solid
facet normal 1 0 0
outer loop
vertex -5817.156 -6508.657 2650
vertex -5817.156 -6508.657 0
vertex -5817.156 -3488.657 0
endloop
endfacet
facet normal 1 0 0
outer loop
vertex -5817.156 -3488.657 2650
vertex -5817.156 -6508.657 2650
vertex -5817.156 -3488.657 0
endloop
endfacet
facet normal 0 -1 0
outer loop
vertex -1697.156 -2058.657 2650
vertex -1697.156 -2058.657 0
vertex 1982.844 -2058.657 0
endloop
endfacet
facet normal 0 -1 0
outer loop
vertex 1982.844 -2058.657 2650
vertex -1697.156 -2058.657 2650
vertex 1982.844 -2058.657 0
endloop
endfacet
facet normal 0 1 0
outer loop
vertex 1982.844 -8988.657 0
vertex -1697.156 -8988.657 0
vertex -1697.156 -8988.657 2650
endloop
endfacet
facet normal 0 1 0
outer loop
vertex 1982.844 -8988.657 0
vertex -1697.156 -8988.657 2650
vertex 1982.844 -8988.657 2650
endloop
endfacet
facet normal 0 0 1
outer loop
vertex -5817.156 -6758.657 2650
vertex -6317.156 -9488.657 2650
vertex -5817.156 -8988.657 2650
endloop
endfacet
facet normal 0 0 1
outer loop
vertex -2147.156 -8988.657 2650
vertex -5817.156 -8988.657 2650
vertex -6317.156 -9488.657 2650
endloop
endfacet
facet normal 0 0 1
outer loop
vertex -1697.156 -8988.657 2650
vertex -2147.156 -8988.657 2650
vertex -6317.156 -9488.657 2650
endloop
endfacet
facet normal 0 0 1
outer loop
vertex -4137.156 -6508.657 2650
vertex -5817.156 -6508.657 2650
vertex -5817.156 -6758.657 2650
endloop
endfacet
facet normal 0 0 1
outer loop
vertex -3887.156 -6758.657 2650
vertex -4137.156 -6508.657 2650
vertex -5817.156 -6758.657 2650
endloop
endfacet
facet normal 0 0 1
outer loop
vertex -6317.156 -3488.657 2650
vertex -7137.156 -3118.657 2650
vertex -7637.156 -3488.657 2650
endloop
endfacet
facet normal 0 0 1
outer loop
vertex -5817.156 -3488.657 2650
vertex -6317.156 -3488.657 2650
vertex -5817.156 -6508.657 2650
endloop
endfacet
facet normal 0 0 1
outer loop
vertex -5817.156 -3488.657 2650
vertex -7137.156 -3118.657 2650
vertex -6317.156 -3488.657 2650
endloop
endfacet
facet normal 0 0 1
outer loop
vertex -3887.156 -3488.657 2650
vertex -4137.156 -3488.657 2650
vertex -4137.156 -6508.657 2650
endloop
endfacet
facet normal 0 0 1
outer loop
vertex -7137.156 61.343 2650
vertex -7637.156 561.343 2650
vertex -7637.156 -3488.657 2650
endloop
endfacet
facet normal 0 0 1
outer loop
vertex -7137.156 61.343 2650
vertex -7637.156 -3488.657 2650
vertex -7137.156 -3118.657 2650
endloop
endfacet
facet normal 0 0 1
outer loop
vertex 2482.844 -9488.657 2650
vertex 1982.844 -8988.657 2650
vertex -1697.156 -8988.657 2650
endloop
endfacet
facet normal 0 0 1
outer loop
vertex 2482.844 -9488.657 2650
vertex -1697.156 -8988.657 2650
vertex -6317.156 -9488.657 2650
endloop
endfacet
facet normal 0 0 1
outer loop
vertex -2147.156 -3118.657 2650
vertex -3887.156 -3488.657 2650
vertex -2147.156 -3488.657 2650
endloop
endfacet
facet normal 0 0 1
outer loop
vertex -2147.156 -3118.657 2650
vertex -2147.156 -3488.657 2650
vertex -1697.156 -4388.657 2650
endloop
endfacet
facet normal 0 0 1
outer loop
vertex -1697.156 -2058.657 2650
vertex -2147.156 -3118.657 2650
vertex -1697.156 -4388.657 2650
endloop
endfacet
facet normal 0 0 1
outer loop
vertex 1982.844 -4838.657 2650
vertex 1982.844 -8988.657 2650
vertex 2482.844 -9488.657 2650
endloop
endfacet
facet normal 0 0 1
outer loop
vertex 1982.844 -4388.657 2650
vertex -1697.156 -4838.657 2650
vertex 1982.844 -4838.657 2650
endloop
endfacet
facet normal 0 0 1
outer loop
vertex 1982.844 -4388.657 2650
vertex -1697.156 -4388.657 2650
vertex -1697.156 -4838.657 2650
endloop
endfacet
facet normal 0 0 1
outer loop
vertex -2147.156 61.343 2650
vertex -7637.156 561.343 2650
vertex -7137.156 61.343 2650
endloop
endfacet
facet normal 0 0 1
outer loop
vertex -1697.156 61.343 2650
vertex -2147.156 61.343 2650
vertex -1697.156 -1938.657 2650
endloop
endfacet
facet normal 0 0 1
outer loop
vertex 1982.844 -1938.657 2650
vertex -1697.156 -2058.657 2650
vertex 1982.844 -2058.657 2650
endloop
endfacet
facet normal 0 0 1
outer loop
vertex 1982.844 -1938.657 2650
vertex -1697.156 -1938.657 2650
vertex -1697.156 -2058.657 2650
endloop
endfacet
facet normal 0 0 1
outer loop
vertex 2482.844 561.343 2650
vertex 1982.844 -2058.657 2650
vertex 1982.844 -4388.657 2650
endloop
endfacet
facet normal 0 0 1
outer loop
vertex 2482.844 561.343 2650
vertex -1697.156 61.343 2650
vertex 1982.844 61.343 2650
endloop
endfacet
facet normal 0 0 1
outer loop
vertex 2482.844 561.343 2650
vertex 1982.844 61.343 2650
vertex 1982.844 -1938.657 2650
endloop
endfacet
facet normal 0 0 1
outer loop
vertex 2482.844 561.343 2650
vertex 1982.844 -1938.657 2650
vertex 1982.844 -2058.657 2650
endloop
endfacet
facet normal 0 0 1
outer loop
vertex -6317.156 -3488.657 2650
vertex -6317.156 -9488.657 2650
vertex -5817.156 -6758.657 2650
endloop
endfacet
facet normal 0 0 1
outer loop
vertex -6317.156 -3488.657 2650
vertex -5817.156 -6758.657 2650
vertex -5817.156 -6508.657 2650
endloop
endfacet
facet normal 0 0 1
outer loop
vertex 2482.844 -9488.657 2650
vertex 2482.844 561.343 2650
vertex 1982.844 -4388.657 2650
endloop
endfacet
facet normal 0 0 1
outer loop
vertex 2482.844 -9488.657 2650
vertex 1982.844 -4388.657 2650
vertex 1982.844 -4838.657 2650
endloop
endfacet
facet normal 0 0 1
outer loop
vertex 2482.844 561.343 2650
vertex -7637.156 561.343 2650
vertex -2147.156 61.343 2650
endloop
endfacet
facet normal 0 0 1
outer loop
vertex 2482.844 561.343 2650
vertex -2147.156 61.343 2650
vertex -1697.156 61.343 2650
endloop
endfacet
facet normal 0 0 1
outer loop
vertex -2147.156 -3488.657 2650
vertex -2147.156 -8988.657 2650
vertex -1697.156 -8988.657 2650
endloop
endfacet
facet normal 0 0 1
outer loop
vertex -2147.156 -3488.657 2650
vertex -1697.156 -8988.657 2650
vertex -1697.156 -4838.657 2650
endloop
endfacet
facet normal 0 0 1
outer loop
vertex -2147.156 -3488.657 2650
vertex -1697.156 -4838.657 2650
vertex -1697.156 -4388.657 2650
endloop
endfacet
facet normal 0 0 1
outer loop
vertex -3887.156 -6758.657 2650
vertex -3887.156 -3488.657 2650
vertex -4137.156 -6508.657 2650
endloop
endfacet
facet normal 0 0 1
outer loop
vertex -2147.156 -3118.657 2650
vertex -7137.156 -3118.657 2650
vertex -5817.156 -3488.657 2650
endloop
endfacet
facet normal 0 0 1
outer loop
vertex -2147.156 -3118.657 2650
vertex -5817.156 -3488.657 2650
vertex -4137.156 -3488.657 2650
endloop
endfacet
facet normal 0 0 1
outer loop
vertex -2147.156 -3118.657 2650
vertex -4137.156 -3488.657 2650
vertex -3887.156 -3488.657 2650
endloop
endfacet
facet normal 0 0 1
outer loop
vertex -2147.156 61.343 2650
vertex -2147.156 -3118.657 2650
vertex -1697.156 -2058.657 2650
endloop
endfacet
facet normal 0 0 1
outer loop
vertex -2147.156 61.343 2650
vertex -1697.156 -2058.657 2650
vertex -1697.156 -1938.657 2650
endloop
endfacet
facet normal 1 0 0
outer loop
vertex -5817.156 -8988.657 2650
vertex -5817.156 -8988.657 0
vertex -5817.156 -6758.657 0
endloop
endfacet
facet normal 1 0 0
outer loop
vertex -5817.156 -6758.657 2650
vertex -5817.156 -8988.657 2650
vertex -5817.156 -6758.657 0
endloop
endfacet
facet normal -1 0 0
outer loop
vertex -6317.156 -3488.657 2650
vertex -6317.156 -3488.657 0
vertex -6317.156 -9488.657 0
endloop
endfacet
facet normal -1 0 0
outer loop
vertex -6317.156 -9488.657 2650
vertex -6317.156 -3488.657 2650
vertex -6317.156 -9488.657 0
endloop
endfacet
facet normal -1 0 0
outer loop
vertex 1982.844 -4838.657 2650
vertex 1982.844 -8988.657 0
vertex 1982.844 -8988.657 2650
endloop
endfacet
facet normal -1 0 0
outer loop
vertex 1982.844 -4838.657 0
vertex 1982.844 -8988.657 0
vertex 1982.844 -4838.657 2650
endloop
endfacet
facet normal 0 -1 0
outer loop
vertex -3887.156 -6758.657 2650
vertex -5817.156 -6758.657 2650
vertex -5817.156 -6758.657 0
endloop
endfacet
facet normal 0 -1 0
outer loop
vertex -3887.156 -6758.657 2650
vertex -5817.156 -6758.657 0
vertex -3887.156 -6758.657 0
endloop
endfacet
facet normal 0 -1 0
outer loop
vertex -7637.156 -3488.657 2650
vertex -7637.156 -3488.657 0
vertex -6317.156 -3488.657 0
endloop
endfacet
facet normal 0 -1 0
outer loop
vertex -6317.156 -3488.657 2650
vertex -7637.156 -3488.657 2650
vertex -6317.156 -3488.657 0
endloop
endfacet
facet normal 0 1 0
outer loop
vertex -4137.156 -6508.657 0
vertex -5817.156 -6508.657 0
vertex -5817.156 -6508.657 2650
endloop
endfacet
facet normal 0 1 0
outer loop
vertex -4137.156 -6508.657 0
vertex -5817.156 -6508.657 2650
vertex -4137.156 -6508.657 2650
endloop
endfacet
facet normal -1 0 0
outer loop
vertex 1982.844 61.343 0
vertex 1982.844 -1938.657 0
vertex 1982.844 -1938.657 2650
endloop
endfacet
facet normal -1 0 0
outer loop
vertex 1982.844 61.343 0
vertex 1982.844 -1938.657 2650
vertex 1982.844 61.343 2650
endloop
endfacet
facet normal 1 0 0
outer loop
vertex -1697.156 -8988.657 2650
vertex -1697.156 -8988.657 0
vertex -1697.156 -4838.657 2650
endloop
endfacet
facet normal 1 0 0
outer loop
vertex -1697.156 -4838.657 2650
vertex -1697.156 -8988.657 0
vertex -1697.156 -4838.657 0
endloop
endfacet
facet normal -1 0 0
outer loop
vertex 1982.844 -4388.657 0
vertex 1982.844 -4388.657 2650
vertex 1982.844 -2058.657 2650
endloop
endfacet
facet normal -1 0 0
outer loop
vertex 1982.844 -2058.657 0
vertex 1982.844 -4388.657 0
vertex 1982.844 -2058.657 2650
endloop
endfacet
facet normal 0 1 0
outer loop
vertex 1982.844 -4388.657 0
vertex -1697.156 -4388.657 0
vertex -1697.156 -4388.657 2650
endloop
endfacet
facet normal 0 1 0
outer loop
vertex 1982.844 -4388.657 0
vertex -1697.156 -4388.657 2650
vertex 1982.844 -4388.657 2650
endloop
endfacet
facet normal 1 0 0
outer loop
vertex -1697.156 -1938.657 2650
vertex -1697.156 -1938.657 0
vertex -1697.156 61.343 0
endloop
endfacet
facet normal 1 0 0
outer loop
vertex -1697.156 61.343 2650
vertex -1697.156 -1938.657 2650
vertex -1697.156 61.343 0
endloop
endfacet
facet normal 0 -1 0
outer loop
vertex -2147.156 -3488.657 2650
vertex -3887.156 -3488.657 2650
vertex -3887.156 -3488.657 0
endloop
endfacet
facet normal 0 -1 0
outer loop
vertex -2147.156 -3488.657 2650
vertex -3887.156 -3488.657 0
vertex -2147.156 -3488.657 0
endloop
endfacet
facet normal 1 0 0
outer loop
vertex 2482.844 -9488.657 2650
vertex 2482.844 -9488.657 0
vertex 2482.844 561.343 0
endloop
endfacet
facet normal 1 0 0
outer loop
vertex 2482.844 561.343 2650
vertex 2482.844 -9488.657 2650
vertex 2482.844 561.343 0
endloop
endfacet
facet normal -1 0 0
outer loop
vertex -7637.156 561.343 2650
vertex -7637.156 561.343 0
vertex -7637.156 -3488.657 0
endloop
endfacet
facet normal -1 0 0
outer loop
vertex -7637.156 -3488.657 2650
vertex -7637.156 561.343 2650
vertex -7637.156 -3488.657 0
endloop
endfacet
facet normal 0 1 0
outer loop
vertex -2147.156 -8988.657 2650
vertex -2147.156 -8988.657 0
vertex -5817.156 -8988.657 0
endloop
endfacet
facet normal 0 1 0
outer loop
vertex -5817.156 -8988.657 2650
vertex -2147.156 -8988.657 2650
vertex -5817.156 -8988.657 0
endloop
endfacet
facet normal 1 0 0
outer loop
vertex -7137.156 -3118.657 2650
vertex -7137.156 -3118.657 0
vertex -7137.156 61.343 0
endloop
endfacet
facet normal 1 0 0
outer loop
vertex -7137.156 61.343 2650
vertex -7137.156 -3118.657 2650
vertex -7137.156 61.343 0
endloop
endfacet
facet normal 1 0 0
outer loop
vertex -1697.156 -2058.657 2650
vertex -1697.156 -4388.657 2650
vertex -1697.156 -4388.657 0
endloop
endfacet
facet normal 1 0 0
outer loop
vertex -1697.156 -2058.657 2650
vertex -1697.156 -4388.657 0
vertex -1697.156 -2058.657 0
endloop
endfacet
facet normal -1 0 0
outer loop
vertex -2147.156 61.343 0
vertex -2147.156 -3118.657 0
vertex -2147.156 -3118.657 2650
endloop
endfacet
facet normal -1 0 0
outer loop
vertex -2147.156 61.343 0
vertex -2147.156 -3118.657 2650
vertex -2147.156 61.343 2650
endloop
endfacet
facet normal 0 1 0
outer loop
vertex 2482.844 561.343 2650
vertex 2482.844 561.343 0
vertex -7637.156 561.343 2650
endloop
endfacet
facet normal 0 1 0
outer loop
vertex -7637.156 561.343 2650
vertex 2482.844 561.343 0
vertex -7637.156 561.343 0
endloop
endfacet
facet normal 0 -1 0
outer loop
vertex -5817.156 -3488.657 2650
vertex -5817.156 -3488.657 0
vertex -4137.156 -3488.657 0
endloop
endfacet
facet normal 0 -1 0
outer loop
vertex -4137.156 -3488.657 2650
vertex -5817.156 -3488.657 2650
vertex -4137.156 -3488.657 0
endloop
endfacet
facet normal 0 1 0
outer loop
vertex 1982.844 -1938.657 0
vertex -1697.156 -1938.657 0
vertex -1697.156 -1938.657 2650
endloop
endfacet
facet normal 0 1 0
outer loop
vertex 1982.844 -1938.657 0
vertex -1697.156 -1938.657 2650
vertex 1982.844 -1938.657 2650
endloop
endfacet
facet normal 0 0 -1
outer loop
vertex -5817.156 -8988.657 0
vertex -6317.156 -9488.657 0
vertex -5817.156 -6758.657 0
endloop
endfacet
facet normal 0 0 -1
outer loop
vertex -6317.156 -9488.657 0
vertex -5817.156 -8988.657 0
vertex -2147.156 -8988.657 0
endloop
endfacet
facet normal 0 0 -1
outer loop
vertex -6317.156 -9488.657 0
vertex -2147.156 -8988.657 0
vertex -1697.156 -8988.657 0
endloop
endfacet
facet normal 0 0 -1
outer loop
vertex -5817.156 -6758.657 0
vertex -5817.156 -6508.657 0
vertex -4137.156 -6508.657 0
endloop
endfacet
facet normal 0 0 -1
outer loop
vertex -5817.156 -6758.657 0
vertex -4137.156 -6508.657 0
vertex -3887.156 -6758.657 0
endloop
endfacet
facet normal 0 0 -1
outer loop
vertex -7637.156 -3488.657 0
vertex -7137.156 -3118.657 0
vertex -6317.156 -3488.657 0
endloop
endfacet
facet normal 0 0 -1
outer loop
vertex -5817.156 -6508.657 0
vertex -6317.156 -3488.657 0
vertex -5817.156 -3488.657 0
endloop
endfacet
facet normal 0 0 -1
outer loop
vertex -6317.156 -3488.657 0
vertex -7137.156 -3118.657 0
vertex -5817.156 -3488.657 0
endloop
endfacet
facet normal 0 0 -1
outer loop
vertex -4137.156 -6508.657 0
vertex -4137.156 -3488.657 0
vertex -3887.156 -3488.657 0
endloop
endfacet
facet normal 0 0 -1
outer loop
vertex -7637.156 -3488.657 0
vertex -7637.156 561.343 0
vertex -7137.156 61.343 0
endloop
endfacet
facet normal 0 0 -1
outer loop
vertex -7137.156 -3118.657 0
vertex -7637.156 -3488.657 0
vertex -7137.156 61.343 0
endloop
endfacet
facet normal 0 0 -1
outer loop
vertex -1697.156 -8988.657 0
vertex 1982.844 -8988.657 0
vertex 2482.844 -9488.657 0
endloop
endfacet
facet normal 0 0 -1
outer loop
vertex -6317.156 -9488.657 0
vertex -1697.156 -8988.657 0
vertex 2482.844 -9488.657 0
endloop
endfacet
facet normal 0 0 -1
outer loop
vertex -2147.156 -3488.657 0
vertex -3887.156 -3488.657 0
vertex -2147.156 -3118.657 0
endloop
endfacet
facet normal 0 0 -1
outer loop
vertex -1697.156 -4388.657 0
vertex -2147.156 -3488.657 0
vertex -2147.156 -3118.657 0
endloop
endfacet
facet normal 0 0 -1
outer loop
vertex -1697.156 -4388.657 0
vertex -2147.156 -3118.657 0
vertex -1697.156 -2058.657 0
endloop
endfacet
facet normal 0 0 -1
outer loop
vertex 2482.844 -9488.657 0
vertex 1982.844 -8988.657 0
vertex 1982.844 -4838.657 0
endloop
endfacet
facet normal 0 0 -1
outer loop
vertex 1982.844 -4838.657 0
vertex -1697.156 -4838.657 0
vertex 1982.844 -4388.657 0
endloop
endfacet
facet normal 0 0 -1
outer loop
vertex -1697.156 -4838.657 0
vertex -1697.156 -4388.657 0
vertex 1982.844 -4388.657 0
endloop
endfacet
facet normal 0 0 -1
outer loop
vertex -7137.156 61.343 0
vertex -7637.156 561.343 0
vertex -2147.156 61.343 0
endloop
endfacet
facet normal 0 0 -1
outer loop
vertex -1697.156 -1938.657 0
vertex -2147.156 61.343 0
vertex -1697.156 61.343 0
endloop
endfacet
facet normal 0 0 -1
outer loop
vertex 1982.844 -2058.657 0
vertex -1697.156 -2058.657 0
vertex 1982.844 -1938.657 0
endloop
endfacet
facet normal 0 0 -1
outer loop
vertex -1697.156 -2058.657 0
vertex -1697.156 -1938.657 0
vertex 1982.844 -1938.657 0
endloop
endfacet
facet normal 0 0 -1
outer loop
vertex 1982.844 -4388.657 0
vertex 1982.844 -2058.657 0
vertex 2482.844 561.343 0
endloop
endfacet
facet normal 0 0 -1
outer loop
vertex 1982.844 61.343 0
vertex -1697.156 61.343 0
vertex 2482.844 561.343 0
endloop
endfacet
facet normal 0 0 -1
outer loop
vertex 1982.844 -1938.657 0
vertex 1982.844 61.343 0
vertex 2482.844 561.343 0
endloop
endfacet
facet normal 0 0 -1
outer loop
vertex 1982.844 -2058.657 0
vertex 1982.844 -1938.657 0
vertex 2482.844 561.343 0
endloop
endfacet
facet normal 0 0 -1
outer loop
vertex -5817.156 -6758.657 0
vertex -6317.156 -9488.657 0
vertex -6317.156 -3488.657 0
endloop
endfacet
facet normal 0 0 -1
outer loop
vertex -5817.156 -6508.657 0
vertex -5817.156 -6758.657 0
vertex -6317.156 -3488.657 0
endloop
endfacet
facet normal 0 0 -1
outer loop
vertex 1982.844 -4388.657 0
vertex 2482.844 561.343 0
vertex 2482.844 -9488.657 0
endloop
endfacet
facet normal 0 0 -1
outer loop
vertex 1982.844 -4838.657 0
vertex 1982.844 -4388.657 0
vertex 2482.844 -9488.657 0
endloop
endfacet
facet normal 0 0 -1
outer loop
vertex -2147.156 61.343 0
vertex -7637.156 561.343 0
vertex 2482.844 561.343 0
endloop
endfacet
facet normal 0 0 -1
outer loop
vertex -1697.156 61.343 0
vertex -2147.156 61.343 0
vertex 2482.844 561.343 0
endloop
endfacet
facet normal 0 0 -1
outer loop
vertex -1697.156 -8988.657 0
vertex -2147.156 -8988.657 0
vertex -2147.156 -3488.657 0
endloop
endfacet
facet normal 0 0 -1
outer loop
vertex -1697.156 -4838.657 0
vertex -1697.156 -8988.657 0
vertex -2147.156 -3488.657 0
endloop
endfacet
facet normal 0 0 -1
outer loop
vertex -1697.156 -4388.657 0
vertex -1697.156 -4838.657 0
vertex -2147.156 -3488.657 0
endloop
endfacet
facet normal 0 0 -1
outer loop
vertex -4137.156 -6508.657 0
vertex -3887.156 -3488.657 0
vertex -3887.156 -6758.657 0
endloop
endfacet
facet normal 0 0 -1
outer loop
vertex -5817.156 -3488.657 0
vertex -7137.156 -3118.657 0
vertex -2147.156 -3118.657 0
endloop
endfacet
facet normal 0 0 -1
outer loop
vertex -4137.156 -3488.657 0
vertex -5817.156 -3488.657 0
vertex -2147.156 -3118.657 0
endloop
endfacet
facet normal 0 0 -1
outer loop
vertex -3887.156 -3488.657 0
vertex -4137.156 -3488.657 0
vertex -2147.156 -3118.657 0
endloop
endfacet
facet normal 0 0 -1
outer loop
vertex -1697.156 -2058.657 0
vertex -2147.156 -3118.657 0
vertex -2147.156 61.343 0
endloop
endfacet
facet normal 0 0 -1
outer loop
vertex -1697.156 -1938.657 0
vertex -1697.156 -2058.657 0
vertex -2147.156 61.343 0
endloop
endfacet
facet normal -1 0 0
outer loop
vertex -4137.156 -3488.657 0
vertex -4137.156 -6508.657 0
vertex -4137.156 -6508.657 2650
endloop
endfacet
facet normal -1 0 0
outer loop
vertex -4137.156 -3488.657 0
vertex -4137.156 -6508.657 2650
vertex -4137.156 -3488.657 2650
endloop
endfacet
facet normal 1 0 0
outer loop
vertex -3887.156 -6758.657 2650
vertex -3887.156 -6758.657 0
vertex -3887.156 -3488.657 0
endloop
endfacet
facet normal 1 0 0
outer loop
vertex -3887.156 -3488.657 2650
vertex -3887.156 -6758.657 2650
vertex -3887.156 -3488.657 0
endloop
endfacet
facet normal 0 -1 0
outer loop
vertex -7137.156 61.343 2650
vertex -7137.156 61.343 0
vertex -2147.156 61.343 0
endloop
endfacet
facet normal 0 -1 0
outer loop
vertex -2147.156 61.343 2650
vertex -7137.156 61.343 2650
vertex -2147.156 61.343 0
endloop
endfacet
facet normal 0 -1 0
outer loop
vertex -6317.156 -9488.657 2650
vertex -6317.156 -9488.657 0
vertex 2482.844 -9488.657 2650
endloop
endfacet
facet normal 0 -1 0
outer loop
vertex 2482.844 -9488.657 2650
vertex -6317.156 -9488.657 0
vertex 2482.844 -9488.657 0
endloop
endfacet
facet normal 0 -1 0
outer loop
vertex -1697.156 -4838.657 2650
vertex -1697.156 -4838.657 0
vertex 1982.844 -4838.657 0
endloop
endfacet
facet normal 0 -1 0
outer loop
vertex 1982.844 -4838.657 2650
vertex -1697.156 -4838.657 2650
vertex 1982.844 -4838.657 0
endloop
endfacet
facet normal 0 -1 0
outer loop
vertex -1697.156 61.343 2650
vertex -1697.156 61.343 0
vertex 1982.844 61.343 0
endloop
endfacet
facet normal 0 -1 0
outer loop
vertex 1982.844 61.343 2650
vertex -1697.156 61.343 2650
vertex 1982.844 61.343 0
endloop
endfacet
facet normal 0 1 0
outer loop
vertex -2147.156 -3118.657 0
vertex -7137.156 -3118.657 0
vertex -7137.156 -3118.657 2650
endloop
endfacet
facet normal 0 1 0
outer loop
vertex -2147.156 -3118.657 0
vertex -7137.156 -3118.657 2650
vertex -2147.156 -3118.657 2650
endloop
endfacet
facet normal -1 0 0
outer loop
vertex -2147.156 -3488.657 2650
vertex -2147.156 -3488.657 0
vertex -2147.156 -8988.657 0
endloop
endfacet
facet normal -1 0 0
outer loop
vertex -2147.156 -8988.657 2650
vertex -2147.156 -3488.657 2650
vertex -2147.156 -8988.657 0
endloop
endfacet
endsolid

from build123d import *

# Parameters (mm, degrees)
F0_W     = 1680
F0_H     = 3020
F0_W_2   = 3680
F0_H_2   = 4150
F0_W_3   = 4990
F0_H_3   = 3180
F0_H_4   = 2330
F0_H_5   = 2000
F1_DEPTH = 2650


with BuildPart() as f1:
    # F0 (on Top) → F1 (new body)
    with BuildSketch(Plane.XY):
        Polygon((-6317.15601, -3488.657475), (-6317.15601, -9488.657475), (2482.84399, -9488.657475), (2482.84399, 561.342525), (-7637.15601, 561.342525), (-7637.15601, -3488.657475), align=None)
        Polygon((-2147.15601, -8988.657475), (-5817.15601, -8988.657475), (-5817.15601, -6758.657475), (-3887.15601, -6758.657475), (-3887.15601, -3488.657475), (-2147.15601, -3488.657475), align=None, mode=Mode.SUBTRACT)
        with Locations((-4977.15601, -4998.657475)):
            Rectangle(F0_W, F0_H, mode=Mode.SUBTRACT)
        with Locations((142.84399, -6913.657475)):
            Rectangle(F0_W_2, F0_H_2, mode=Mode.SUBTRACT)
        with Locations((-4642.15601, -1528.657475)):
            Rectangle(F0_W_3, F0_H_3, mode=Mode.SUBTRACT)
        with Locations((142.84399, -3223.657475)):
            Rectangle(F0_W_2, F0_H_4, mode=Mode.SUBTRACT)
        with Locations((142.84399, -938.657475)):
            Rectangle(F0_W_2, F0_H_5, mode=Mode.SUBTRACT)
    extrude(amount=F1_DEPTH)


solid = f1.part
